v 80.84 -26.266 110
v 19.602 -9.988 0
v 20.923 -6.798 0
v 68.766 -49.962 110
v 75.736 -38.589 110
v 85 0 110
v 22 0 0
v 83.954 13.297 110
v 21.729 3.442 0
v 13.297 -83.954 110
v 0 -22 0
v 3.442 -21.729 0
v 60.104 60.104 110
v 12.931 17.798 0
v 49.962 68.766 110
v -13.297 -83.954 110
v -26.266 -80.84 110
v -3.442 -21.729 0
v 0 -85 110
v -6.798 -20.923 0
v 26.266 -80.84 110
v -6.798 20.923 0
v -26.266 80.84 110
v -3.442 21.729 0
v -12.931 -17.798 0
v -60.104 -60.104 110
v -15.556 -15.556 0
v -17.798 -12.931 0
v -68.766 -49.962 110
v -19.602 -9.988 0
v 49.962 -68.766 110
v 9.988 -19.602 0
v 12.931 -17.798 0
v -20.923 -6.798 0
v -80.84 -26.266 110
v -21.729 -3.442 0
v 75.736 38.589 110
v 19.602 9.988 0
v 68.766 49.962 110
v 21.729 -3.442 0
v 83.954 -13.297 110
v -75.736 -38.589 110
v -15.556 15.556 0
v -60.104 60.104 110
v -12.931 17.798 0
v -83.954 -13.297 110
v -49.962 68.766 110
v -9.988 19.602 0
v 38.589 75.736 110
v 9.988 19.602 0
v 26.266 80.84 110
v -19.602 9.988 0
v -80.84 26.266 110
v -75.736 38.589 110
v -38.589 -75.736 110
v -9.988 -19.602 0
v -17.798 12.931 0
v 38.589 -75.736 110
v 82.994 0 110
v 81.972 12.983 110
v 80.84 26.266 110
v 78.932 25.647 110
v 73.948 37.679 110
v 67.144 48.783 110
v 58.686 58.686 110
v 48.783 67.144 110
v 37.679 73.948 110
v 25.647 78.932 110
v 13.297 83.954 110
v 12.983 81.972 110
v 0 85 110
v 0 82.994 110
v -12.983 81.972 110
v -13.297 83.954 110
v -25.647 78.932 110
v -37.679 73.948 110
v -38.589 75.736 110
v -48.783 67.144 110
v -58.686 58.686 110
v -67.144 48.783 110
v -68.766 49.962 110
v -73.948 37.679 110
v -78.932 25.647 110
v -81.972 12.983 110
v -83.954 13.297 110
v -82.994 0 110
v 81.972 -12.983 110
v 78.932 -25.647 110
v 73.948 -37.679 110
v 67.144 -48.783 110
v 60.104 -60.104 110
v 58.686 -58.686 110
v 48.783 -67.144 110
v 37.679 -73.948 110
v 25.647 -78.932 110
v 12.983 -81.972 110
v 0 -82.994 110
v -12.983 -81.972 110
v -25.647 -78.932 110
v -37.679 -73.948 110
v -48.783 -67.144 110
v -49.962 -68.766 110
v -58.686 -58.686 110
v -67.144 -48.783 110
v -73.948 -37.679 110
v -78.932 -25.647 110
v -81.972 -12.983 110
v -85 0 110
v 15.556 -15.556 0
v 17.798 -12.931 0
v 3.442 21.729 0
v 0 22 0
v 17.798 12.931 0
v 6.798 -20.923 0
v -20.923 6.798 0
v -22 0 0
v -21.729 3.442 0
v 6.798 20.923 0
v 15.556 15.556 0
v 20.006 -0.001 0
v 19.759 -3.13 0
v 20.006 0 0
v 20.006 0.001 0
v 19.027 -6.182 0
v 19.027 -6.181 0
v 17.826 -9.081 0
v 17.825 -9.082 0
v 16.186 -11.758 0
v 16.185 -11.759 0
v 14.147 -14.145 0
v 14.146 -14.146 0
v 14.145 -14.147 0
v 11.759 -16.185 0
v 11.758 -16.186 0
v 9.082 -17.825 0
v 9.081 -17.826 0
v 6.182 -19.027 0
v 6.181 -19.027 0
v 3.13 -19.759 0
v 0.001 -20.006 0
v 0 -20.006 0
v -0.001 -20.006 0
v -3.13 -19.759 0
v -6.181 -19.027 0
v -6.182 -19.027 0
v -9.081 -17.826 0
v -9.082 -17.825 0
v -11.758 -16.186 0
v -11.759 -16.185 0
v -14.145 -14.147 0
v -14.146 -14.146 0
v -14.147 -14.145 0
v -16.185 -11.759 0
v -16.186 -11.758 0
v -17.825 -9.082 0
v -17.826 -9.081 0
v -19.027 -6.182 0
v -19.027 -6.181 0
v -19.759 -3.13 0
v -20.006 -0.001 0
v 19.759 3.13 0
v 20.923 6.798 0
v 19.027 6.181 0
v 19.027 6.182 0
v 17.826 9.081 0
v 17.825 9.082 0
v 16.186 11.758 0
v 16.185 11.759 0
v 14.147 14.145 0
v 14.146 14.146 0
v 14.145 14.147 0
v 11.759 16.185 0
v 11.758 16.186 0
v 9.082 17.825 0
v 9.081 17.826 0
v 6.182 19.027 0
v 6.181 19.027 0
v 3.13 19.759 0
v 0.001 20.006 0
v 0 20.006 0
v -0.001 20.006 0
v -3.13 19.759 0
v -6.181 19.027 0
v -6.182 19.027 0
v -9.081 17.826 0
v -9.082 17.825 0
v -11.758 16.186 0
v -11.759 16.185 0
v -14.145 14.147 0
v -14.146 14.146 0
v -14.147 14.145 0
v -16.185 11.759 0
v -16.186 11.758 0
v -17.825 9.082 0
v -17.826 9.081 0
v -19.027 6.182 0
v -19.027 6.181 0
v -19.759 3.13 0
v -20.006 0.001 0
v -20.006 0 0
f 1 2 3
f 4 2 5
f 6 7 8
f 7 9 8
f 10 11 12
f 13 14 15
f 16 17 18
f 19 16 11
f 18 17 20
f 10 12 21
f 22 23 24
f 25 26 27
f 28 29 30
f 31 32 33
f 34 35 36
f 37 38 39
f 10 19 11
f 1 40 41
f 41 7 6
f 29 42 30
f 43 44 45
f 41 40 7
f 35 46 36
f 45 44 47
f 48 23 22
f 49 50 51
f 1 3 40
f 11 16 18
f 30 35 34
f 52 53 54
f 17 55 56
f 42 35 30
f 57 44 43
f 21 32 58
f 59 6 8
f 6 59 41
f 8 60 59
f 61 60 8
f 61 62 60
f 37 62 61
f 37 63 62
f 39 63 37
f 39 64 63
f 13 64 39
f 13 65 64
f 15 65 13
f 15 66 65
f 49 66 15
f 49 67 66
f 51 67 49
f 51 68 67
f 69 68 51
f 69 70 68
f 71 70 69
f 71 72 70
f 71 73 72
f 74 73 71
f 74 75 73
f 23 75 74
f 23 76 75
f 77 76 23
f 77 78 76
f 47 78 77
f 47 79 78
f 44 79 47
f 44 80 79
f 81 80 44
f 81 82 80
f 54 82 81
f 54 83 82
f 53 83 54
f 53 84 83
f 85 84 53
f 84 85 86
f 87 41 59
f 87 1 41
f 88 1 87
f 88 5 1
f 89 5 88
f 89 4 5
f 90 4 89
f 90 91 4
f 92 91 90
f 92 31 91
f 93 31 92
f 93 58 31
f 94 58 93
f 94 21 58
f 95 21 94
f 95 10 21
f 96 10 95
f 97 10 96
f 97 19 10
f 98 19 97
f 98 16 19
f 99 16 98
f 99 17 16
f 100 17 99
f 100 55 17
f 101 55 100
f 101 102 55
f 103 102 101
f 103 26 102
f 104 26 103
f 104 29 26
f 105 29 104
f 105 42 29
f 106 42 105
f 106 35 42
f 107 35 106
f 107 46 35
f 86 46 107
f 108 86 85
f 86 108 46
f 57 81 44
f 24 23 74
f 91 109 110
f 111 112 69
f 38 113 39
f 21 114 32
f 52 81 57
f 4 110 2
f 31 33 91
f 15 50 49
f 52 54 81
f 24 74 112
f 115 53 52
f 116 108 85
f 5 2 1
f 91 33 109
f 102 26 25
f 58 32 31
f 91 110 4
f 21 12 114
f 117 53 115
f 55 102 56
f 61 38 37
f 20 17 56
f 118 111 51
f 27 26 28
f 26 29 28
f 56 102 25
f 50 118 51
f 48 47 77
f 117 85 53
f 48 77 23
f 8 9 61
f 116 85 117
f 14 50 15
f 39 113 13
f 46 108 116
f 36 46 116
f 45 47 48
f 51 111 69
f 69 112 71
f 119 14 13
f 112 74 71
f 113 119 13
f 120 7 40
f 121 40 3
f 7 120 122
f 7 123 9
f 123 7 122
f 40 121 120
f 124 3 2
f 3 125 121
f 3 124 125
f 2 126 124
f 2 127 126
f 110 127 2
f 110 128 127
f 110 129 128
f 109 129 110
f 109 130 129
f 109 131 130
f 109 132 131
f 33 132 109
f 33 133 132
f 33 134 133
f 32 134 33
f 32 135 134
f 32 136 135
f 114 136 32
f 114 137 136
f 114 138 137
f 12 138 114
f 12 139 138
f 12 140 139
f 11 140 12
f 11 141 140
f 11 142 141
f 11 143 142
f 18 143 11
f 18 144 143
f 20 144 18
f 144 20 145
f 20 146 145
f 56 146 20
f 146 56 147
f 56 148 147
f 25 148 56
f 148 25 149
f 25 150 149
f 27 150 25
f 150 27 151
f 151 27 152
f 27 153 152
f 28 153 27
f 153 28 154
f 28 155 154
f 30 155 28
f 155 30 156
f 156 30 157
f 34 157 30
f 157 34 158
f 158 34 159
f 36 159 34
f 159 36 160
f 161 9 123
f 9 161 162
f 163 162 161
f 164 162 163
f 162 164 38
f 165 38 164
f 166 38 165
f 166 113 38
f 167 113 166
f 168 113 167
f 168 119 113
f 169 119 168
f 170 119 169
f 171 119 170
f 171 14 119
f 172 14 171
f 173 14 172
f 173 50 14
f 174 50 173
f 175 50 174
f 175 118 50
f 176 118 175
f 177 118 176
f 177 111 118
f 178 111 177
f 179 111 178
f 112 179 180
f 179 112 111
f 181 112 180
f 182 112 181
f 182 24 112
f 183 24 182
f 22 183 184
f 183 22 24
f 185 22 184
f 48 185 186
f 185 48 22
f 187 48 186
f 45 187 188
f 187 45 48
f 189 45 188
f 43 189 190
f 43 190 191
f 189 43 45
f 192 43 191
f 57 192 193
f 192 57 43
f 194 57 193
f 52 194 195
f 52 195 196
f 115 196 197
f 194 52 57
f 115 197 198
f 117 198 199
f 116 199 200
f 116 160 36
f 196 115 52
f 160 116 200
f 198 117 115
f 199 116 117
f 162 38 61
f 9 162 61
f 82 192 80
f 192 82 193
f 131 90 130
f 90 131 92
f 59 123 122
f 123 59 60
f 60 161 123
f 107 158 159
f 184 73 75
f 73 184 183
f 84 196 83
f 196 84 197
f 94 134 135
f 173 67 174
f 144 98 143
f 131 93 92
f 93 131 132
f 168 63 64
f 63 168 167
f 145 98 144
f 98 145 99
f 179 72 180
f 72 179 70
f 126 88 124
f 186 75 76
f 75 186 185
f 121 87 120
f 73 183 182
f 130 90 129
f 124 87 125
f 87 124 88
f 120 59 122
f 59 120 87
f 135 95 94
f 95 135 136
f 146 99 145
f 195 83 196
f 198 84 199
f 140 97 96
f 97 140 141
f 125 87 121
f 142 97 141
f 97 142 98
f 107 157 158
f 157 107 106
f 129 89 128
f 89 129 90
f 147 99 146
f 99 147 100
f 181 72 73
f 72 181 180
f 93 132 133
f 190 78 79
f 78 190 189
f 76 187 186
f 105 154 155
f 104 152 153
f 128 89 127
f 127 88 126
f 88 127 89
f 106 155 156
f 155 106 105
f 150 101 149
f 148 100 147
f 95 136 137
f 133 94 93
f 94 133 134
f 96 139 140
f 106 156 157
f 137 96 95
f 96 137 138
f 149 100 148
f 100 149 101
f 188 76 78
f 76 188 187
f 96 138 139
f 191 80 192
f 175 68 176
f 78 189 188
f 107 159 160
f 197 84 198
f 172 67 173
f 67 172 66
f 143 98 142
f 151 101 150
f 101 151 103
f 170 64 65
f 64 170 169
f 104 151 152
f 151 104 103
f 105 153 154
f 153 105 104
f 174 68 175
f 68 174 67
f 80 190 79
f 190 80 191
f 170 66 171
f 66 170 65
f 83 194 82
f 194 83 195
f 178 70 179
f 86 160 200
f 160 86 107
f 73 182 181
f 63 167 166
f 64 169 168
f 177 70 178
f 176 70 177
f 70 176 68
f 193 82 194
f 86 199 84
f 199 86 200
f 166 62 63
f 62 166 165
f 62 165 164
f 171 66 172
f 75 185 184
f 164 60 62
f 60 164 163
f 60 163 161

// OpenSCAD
height = 110;
bottom_d = 44;
top_d = 170;
facets = 40;

bottom_r=bottom_d/2;
top_r=top_d/2;
thickness=2;

difference() {
cylinder(height, bottom_r, top_r, $fn=facets);
translate([0,0,-0.01])
    cylinder(height+0.02, bottom_r-thickness, top_r-thickness, $fn=facets);
}
